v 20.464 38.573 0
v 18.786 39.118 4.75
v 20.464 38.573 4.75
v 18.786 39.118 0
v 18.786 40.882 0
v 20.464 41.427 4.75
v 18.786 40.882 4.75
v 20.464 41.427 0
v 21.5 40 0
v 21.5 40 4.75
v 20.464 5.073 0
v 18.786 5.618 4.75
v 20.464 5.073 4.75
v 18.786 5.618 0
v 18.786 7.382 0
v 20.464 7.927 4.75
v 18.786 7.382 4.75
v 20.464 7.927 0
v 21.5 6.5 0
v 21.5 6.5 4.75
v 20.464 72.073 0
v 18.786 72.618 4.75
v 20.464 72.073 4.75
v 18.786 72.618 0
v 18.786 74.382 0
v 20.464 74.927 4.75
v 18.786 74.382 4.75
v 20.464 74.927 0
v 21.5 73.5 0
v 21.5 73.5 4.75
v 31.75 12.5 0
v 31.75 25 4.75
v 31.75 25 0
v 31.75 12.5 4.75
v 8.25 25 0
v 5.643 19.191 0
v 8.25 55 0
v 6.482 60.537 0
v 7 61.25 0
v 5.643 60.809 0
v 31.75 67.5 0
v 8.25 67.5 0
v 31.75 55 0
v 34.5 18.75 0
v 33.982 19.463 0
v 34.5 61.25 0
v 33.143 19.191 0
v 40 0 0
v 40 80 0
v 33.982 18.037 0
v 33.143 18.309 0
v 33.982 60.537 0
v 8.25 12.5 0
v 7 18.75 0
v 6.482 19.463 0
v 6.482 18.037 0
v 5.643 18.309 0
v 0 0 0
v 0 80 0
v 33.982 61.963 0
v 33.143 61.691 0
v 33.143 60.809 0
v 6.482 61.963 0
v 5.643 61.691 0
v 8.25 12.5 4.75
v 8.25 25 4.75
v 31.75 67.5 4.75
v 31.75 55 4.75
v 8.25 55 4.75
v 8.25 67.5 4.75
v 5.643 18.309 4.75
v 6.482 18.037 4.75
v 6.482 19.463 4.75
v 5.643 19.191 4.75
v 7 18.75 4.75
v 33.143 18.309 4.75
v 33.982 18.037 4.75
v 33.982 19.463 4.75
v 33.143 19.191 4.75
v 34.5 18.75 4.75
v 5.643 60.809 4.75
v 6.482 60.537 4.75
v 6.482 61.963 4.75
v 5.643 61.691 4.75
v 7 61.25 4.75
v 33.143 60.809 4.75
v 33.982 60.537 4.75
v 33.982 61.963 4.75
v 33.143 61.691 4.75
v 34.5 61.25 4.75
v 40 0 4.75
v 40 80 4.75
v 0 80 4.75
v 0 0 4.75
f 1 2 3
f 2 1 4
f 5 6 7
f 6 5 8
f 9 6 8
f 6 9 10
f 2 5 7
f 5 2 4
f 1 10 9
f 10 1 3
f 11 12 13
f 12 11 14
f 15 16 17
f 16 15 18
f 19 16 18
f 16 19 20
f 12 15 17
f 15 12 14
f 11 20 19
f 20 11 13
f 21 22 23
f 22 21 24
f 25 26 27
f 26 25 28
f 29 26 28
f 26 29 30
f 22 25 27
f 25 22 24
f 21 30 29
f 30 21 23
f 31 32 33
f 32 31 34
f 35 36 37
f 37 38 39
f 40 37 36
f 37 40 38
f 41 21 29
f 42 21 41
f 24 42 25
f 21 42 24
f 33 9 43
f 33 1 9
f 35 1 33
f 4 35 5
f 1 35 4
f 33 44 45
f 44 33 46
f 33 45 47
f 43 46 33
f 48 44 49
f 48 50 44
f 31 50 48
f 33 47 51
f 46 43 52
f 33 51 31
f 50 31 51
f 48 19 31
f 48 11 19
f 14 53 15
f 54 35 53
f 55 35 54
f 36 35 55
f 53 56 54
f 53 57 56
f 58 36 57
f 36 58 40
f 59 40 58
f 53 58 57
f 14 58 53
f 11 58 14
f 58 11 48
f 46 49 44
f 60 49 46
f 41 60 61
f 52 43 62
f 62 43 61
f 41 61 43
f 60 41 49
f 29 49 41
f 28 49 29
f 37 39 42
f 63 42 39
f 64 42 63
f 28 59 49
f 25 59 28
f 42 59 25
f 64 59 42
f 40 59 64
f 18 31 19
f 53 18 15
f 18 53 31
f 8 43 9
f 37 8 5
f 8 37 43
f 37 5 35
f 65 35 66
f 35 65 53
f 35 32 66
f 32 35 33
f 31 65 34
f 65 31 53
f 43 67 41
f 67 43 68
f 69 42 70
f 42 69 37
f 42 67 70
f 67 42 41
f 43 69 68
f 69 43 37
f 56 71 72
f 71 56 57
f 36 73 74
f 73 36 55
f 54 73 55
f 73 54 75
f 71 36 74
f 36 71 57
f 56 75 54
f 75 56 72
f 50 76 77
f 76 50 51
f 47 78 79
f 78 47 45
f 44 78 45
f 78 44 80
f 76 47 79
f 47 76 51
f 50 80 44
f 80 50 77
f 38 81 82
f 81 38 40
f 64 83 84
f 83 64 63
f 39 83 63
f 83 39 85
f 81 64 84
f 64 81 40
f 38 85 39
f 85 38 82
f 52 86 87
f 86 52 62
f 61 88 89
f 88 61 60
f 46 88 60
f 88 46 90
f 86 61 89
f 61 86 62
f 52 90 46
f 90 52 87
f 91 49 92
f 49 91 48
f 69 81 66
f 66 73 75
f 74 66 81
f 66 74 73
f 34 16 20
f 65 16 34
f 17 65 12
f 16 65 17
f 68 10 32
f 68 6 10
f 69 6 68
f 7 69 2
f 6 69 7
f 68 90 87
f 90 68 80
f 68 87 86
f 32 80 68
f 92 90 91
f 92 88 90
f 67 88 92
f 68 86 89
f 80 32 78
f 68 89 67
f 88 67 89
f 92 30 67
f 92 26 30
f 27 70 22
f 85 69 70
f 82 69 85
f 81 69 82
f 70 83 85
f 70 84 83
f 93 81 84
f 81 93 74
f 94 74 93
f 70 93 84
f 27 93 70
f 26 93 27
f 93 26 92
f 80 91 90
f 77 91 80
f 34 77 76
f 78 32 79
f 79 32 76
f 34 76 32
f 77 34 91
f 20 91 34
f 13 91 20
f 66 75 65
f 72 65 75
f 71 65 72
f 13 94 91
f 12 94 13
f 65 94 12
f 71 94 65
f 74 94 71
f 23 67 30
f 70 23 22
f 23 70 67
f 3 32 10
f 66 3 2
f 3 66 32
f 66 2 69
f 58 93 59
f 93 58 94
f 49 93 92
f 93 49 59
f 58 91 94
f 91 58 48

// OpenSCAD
//Hip

//variables
xRectangle = 40;
yRectangle = 80;
zRectangle = 4.75;

xRectDiff = 23.5;
yRectDiff = 12.5;
zRectDiff = zRectangle+1;

xRectDiffPos = 8.25;
yRectDiffPos = 12.5;

bigHolesD = 3;
smallHolesD = 1.5;
smallHolesMargin = 1.25;
holesHeight = zRectangle +1;

//modules
module mainRectangle(){
    difference(){
        cube([xRectangle, yRectangle, zRectangle]);
        bigRoundedHoles();
        rectangularHoles();
        smallRoundedHoles();
    }
}

module bigRoundedHoles(){
    translate([xRectangle/2, yRectangle/2, zRectangle/2])
        cylinder(h=holesHeight, d=bigHolesD,center=true);
    
    translate([xRectangle/2, 8-bigHolesD/2, zRectangle/2])
        cylinder(h=holesHeight, d=bigHolesD,center=true);
    
    translate([xRectangle/2, yRectangle-8+bigHolesD/2, zRectangle/2])
        cylinder(h=holesHeight, d=bigHolesD,center=true);
}

module rectangularHoles(){
    translate([xRectDiffPos,yRectDiffPos,0])
        cube([xRectDiff, yRectDiff, zRectDiff]);
    
    translate([xRectDiffPos,yRectangle-yRectDiffPos-yRectDiff,0])
        cube([xRectDiff, yRectDiff, zRectDiff]);
}

module smallRoundedHoles(){
    translate([xRectDiffPos-smallHolesMargin-smallHolesD/2,yRectDiffPos + yRectDiff/2,zRectangle/2])
        cylinder(h=holesHeight, d=smallHolesD,center=true);
    
    translate([xRectDiffPos+xRectDiff+smallHolesMargin+smallHolesD/2,yRectDiffPos + yRectDiff/2,zRectangle/2])
        cylinder(h=holesHeight, d=smallHolesD,center=true);
    
    translate([xRectDiffPos-smallHolesMargin-smallHolesD/2,yRectangle-yRectDiffPos-yRectDiff/2,zRectangle/2])
        cylinder(h=holesHeight, d=smallHolesD,center=true);
    
    translate([xRectDiffPos+xRectDiff+smallHolesMargin+smallHolesD/2,yRectangle-yRectDiffPos-yRectDiff/2,zRectangle/2])
        cylinder(h=holesHeight, d=smallHolesD,center=true);
}

module hip(){
    mainRectangle();
}

hip();
